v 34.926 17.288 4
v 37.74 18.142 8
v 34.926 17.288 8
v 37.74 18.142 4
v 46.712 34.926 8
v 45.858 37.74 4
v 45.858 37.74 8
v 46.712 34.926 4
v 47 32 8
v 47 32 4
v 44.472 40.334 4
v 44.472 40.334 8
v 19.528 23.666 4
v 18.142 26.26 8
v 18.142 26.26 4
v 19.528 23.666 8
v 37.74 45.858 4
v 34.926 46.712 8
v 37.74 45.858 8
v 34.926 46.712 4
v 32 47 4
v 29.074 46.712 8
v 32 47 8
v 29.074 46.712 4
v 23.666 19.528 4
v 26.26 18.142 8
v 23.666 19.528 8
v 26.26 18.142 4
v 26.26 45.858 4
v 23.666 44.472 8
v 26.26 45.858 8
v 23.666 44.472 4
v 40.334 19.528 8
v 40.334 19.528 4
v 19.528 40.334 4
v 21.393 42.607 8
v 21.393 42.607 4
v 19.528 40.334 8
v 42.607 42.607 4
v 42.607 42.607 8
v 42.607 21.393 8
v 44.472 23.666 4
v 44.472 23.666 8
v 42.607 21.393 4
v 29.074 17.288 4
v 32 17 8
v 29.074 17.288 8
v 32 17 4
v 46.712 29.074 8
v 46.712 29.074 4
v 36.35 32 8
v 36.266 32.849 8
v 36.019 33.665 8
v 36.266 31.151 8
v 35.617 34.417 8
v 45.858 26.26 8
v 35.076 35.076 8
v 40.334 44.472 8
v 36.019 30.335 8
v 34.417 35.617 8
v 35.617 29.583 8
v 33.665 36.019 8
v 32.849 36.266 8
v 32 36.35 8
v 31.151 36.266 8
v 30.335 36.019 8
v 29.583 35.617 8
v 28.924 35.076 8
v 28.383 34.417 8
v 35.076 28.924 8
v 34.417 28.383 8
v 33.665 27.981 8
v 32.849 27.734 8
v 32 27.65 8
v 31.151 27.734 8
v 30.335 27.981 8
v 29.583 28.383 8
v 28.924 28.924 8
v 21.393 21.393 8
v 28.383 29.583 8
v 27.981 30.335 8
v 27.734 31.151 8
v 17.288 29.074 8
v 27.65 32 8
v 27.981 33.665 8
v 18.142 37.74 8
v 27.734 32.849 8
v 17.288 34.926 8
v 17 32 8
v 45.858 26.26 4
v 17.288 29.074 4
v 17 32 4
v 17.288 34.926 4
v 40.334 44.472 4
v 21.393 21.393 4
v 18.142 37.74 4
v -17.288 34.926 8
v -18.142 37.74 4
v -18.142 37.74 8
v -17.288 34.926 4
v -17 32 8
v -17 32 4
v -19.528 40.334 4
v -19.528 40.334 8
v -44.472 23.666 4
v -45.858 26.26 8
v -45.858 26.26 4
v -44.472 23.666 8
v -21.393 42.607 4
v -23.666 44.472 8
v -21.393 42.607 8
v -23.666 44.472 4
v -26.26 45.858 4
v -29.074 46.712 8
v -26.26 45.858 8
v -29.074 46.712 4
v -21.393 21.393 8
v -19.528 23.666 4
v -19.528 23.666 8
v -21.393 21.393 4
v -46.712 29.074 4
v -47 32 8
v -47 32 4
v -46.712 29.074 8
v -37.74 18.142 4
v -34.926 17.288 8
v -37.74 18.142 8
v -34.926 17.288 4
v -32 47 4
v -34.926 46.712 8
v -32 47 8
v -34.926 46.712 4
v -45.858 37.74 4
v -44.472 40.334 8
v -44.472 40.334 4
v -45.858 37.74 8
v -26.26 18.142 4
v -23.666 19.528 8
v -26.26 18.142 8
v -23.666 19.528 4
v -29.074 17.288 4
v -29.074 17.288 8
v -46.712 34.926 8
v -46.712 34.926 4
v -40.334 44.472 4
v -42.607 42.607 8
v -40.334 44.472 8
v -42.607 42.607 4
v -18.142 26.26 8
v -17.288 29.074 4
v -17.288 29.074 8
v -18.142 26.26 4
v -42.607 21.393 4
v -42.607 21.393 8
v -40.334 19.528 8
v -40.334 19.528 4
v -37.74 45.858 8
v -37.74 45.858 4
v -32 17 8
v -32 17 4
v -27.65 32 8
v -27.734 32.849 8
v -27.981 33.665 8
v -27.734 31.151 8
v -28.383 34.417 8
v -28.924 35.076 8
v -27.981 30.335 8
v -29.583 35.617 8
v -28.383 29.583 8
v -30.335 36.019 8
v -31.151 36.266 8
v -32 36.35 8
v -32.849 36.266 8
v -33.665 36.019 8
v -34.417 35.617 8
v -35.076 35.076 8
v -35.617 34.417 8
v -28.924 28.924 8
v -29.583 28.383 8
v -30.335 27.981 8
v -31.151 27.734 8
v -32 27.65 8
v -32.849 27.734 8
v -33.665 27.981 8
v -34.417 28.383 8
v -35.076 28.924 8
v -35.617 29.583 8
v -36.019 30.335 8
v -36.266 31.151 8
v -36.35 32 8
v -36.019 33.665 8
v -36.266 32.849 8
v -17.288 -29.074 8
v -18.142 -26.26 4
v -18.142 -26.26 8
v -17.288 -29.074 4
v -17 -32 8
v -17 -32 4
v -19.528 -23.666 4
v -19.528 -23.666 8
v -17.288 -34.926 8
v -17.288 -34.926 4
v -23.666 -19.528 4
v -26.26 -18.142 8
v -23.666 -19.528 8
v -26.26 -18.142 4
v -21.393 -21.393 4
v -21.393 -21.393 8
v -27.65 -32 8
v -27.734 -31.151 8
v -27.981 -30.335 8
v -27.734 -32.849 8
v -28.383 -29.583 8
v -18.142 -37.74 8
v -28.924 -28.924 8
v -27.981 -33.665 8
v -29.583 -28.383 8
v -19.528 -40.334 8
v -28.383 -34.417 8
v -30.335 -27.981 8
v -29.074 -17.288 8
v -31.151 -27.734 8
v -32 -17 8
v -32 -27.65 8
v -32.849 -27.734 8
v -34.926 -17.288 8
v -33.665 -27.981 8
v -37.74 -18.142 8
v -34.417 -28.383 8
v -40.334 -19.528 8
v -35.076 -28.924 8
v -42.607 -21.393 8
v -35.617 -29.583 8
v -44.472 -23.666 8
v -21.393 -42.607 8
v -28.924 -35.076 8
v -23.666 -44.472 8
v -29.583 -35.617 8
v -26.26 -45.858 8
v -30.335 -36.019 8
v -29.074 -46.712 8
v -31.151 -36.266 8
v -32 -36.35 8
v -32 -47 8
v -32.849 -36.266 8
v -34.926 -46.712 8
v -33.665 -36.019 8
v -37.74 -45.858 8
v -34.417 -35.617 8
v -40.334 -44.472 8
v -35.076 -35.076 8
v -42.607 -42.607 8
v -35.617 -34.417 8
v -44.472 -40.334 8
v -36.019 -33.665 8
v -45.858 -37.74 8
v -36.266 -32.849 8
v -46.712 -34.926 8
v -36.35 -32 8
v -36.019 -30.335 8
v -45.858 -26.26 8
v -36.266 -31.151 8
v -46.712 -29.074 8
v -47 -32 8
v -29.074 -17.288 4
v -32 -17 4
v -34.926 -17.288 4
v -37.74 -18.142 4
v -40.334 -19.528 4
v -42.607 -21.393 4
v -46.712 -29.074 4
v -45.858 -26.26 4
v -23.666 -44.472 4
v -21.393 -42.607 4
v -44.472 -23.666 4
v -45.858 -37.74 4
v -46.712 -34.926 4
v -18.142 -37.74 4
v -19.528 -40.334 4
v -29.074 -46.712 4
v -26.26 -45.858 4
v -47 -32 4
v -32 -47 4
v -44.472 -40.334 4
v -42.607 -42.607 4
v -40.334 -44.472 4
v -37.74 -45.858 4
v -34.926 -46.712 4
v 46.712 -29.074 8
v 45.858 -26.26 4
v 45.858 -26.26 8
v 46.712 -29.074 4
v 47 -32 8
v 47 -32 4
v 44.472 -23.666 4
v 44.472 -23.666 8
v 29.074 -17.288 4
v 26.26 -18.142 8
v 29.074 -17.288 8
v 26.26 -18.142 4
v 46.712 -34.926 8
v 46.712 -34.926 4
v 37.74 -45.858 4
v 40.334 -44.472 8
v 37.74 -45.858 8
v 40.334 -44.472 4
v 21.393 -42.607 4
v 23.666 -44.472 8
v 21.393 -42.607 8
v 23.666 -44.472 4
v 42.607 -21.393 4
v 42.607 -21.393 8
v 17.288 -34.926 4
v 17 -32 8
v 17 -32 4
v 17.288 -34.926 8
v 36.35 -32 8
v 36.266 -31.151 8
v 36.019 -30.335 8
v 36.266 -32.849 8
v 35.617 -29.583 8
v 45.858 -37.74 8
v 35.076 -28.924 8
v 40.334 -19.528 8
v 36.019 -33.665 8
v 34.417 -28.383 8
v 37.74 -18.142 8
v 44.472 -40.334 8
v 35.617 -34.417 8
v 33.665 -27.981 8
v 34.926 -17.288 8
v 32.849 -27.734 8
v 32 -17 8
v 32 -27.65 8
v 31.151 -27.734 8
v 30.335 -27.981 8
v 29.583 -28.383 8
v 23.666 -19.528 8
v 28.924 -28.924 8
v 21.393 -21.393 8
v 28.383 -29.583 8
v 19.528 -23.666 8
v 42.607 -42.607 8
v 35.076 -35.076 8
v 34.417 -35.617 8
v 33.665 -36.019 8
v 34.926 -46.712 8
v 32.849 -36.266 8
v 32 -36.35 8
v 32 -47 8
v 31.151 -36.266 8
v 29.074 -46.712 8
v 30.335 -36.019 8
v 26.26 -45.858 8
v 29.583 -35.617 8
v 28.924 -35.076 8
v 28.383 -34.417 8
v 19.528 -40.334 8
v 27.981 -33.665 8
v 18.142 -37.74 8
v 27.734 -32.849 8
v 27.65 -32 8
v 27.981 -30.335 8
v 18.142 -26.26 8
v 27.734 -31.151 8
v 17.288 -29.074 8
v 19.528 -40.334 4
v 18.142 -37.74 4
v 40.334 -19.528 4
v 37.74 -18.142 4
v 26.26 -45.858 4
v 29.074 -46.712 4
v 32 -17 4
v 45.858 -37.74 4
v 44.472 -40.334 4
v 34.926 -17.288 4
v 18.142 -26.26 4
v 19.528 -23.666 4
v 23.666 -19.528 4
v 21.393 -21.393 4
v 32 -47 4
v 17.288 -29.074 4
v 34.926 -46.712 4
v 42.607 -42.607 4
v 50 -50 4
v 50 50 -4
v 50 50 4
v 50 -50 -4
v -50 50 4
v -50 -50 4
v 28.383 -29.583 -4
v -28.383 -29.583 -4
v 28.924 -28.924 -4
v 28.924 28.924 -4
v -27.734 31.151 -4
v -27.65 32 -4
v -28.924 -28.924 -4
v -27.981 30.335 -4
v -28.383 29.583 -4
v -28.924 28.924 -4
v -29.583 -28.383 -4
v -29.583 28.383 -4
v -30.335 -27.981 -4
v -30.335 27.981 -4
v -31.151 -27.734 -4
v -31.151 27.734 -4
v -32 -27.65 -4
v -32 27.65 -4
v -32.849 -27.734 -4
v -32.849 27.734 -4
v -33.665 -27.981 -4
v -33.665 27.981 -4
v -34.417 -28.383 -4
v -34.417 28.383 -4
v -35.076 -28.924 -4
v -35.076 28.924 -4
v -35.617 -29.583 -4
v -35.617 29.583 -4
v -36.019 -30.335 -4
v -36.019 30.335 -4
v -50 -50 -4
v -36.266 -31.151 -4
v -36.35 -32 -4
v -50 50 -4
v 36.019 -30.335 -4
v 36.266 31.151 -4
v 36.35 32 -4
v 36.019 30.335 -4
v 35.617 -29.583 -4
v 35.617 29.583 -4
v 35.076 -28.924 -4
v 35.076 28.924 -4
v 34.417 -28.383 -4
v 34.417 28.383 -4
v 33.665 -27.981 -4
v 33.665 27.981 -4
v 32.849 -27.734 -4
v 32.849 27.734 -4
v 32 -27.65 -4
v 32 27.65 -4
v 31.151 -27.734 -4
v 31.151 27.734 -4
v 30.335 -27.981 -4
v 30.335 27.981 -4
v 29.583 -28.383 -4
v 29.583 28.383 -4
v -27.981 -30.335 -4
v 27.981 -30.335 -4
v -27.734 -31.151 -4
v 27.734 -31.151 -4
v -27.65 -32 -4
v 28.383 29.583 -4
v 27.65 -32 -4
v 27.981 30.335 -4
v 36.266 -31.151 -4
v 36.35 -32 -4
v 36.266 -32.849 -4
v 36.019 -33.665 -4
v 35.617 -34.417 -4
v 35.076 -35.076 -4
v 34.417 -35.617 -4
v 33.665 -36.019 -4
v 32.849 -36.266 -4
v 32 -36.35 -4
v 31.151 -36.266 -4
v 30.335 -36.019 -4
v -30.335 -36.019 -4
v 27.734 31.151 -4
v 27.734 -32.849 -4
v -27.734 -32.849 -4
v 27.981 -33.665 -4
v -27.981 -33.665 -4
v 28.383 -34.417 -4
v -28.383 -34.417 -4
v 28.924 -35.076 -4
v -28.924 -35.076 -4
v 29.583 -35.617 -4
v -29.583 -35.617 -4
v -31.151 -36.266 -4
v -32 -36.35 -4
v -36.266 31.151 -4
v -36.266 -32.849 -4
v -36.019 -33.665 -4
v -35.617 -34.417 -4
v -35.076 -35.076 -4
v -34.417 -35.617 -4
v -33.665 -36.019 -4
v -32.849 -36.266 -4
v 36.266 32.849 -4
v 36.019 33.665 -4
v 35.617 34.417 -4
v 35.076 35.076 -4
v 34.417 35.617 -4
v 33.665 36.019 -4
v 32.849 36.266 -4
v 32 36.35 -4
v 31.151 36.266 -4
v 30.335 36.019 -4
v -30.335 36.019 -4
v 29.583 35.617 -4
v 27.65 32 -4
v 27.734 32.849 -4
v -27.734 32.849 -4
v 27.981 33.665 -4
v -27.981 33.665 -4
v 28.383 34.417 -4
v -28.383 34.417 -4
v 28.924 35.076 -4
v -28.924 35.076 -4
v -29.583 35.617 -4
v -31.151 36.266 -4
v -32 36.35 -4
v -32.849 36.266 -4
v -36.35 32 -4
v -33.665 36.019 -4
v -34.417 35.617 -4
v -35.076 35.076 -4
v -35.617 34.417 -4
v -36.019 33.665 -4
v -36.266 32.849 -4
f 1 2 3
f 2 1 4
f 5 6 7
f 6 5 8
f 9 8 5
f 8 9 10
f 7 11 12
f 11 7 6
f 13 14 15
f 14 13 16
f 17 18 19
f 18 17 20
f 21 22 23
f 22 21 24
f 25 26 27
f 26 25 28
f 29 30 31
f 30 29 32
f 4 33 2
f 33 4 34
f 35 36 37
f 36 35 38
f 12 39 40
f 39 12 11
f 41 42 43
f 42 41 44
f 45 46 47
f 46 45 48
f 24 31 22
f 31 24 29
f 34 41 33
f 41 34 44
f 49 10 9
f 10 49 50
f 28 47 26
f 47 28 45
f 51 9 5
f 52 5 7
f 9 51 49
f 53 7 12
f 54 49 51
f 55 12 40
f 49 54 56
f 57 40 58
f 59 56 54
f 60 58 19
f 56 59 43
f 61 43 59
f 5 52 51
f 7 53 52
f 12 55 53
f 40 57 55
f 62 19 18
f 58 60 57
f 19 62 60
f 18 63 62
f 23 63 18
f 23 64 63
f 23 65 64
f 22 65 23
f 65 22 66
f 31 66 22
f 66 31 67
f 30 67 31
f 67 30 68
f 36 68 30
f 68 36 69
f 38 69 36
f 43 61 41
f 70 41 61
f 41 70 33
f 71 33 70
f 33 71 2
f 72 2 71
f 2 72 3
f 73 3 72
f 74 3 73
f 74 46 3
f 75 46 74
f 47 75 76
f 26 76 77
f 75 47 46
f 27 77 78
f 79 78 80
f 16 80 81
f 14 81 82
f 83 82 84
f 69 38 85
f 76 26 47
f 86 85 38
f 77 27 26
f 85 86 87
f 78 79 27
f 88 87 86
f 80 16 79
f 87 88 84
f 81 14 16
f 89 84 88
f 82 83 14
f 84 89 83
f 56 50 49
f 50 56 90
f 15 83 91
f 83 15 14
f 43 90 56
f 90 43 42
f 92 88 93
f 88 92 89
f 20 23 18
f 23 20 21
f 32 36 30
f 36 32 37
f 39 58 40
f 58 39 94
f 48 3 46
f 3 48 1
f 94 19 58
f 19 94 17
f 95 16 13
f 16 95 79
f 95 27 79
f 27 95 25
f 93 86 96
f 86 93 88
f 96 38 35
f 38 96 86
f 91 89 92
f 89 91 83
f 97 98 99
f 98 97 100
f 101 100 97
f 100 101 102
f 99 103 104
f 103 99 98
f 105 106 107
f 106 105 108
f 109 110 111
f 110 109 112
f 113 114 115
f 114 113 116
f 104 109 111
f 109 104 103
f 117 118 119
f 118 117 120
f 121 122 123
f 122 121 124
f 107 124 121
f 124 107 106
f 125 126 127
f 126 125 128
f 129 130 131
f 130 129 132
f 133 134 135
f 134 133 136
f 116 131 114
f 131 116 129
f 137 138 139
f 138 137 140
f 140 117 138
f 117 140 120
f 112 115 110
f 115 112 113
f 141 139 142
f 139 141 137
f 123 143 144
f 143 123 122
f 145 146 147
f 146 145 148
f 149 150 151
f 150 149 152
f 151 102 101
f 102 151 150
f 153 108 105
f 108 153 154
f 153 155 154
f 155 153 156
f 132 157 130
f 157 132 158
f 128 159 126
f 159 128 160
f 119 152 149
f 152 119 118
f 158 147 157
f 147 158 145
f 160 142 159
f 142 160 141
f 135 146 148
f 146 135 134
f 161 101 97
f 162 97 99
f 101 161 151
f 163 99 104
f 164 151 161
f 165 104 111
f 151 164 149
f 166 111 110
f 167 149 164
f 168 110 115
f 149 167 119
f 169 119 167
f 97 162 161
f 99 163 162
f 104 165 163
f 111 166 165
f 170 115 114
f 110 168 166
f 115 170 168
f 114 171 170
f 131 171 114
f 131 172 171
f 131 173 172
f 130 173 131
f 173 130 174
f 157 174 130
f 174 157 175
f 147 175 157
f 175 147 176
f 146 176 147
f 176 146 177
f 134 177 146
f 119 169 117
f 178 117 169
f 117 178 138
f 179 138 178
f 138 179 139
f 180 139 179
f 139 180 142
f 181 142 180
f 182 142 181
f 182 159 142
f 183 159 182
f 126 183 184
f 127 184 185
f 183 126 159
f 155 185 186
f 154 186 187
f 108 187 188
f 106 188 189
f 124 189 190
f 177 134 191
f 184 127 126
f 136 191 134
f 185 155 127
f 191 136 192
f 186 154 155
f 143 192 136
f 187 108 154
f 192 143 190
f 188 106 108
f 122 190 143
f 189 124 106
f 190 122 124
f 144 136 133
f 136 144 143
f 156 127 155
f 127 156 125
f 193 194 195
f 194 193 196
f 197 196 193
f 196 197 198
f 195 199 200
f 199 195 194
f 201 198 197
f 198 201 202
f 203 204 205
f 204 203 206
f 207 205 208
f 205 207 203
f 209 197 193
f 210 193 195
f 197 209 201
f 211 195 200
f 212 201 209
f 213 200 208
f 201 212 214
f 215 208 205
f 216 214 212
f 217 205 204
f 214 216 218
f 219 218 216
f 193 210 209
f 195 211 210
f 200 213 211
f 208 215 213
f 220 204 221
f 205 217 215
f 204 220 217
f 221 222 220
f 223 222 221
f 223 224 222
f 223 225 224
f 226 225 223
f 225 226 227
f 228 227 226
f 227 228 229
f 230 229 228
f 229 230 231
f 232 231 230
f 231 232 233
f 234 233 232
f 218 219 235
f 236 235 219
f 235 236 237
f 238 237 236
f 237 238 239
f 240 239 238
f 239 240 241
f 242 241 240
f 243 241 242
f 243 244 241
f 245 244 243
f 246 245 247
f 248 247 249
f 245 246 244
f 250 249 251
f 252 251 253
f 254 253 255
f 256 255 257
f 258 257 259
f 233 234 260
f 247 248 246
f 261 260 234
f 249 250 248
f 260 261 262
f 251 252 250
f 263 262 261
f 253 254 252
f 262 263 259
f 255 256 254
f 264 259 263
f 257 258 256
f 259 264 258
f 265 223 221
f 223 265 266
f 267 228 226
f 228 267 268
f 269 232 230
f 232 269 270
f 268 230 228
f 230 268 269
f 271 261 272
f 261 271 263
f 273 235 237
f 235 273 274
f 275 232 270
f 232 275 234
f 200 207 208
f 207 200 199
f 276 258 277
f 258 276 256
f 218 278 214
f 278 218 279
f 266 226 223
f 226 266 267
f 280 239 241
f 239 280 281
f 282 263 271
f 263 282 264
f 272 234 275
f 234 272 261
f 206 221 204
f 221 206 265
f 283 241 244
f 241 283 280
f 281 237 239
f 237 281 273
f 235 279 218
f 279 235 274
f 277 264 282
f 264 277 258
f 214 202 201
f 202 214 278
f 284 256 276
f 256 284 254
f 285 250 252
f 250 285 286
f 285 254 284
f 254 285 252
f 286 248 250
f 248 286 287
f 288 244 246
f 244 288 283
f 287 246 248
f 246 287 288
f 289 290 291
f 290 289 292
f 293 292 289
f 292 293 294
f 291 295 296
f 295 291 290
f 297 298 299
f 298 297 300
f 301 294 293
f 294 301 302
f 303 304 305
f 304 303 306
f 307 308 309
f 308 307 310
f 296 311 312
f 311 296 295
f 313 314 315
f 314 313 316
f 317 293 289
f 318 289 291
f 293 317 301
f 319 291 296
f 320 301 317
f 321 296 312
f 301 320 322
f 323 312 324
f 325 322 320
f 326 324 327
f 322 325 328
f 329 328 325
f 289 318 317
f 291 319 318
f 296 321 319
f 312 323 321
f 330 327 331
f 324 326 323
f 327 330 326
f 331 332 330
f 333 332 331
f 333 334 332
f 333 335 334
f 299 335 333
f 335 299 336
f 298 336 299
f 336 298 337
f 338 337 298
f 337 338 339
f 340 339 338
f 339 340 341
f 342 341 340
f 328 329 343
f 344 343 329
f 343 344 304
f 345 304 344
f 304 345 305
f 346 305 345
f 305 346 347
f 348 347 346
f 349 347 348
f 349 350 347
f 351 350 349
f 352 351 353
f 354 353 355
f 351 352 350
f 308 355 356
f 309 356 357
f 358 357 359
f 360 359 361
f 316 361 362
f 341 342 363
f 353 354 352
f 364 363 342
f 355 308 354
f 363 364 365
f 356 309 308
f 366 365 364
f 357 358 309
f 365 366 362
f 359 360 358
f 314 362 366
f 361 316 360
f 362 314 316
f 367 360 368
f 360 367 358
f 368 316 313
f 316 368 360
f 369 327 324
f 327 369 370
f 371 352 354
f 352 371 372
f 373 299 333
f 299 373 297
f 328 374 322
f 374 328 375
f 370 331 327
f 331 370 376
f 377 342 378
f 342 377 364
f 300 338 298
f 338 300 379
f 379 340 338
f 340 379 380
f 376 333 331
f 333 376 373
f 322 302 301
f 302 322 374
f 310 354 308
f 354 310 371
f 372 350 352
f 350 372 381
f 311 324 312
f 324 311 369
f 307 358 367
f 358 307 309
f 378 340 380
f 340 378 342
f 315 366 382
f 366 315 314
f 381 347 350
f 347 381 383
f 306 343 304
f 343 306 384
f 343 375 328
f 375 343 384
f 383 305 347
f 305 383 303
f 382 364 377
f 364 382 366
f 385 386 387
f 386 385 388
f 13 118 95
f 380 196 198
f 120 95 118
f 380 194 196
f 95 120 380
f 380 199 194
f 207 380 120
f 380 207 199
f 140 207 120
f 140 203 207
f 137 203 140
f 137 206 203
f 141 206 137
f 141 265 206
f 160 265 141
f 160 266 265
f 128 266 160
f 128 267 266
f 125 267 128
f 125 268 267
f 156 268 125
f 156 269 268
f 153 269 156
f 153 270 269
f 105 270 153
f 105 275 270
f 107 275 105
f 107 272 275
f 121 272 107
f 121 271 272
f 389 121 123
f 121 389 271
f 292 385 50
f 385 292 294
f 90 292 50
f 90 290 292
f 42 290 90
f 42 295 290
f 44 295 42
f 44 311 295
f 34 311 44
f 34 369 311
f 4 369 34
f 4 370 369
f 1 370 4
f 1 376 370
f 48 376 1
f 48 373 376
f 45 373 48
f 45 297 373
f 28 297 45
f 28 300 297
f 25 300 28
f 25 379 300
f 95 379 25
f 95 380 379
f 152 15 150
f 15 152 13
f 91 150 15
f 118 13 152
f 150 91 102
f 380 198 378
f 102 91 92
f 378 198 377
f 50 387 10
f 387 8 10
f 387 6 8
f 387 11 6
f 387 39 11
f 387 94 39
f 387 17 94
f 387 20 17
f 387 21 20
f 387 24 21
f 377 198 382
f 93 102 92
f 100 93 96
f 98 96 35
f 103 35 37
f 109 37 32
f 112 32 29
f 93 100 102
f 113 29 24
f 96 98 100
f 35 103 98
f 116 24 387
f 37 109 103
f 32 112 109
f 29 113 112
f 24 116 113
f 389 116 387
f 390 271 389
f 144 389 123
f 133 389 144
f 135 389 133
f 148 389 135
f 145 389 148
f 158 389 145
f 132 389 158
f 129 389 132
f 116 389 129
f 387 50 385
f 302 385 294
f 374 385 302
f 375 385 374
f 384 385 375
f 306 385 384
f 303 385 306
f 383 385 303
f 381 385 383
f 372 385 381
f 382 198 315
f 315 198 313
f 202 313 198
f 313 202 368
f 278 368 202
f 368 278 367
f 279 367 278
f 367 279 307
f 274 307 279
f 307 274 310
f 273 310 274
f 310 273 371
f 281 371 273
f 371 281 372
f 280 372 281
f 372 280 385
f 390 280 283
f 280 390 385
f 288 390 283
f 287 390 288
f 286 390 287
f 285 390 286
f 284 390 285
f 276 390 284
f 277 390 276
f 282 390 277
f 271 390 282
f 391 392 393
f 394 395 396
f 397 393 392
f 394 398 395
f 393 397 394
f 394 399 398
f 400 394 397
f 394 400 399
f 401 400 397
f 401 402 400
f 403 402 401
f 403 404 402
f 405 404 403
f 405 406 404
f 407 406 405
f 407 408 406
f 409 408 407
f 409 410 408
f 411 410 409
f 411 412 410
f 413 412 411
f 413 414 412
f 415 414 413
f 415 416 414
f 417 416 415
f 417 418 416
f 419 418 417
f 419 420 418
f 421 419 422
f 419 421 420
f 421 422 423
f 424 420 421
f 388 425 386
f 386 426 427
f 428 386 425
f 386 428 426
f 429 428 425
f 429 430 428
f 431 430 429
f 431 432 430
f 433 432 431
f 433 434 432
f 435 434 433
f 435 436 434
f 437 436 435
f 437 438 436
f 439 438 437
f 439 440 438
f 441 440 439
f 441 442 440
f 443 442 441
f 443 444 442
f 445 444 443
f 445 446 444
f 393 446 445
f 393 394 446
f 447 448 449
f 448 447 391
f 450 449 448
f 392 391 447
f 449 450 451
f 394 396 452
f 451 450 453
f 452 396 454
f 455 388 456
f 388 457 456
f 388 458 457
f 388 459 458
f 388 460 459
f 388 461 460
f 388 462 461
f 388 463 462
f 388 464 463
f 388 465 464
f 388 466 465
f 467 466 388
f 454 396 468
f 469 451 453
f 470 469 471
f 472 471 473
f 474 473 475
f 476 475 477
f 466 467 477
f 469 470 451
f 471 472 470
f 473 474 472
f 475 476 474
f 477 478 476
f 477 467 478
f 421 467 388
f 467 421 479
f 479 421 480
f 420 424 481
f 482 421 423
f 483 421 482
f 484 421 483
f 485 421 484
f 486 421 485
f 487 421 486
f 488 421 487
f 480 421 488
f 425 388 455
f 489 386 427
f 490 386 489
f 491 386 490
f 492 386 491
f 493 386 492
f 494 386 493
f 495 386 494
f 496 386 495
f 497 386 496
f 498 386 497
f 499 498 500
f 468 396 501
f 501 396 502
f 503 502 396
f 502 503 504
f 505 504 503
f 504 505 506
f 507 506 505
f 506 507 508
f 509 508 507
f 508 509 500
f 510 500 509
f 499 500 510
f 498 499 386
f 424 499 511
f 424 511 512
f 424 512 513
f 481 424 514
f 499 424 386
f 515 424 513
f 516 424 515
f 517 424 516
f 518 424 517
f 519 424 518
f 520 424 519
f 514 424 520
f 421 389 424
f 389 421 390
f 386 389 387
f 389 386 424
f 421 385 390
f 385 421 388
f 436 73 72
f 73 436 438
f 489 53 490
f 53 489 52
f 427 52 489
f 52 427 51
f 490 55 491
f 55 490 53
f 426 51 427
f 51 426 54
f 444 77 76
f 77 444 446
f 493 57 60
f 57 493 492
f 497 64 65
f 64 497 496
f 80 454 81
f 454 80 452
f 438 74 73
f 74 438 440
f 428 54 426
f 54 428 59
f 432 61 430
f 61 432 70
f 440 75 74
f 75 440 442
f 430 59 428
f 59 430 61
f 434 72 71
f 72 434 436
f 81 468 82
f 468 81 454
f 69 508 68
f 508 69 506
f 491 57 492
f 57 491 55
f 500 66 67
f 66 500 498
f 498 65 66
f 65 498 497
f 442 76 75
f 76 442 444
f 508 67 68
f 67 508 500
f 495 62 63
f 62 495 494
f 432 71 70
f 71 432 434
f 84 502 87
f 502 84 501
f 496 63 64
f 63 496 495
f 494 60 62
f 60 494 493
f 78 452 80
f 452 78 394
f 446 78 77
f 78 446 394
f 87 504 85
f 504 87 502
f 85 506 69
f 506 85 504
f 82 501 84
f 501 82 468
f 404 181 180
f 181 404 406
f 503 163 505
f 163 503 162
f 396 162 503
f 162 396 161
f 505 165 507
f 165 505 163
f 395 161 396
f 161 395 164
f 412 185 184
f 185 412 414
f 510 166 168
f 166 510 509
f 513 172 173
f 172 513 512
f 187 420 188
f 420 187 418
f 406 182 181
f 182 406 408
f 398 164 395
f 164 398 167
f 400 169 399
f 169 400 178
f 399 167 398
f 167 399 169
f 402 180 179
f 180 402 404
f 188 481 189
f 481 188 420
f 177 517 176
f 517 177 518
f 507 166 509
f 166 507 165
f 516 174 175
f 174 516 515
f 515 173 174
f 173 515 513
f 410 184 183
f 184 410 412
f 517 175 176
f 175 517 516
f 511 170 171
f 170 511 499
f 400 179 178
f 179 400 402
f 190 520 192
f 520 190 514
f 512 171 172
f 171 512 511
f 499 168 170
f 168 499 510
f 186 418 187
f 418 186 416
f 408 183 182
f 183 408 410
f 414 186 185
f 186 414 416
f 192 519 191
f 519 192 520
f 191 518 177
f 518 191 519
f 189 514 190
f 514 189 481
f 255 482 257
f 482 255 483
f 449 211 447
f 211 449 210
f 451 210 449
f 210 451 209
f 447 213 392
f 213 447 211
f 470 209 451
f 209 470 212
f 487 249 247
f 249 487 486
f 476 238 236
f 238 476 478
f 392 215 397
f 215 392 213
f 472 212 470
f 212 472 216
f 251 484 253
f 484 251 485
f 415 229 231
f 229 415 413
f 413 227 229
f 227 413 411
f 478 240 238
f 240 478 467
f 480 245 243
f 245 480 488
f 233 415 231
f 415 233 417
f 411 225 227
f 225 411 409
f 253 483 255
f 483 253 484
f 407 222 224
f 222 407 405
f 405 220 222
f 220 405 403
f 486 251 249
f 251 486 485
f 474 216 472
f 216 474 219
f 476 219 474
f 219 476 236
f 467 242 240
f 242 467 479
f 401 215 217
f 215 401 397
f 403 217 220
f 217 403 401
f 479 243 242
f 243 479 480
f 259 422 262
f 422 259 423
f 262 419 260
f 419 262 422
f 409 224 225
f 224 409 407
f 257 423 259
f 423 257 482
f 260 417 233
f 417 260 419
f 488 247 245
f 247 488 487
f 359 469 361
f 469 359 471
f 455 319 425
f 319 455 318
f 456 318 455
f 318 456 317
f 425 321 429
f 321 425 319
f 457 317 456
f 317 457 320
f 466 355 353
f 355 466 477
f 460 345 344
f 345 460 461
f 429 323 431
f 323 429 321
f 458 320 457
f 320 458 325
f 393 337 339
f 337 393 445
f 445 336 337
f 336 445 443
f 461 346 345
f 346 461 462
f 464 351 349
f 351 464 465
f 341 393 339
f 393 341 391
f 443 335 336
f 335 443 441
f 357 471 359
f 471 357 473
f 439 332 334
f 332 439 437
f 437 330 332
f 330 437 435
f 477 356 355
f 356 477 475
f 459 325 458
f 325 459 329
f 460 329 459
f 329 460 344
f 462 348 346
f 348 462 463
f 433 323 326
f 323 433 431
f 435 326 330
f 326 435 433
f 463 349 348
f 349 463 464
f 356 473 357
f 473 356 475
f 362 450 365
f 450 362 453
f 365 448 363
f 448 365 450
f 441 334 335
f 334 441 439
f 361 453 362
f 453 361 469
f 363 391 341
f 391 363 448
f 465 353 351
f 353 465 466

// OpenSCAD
$fn = 32;

// ----------------------------------------------------------------------
// Anchor pads 100 x 100 x 12
// four corner bosses with anchor holes
// ----------------------------------------------------------------------

// --- parameters (mm) ---
plate = [100, 100, 8];  // base plate size (x, y, z)
pads = 4;               // boss count, one per corner
edge = 18;              // boss centre offset from the plate edge
boss_d = 30;            // boss diameter
boss_h = 4;             // boss height above the base plate
bore_d = 8.4;           // nominal hole diameter from the drawing
print_allowance = 0.3;  // clearance added for printing

// --- derived feature positions (mm) ---
hole_d = bore_d + print_allowance;  // = 8.7   hole diameter as printed
height = plate[2] + boss_h;         // = 12   overall height of the part
corner_x = plate[0] / 2 - edge;     // = 32   boss centre X
corner_y = plate[1] / 2 - edge;     // = 32   boss centre Y
feature_centers = [
  [corner_x, corner_y],
  [-corner_x, corner_y],
  [-corner_x, -corner_y],
  [corner_x, -corner_y]
];   // boss centres, anchor holes are drilled there

// base plate, four bosses standing on it, anchor holes all the way through
difference() {
  union() {
    cube(plate, center = true);
    for (centre = feature_centers)
      translate([centre[0], centre[1], plate[2] / 2 - 1])
        cylinder(d = boss_d, h = boss_h + 1);
  }
  for (centre = feature_centers)
    translate([centre[0], centre[1], -height])
      cylinder(d = hole_d, h = 2 * height + 2);  // through boss and plate
}
